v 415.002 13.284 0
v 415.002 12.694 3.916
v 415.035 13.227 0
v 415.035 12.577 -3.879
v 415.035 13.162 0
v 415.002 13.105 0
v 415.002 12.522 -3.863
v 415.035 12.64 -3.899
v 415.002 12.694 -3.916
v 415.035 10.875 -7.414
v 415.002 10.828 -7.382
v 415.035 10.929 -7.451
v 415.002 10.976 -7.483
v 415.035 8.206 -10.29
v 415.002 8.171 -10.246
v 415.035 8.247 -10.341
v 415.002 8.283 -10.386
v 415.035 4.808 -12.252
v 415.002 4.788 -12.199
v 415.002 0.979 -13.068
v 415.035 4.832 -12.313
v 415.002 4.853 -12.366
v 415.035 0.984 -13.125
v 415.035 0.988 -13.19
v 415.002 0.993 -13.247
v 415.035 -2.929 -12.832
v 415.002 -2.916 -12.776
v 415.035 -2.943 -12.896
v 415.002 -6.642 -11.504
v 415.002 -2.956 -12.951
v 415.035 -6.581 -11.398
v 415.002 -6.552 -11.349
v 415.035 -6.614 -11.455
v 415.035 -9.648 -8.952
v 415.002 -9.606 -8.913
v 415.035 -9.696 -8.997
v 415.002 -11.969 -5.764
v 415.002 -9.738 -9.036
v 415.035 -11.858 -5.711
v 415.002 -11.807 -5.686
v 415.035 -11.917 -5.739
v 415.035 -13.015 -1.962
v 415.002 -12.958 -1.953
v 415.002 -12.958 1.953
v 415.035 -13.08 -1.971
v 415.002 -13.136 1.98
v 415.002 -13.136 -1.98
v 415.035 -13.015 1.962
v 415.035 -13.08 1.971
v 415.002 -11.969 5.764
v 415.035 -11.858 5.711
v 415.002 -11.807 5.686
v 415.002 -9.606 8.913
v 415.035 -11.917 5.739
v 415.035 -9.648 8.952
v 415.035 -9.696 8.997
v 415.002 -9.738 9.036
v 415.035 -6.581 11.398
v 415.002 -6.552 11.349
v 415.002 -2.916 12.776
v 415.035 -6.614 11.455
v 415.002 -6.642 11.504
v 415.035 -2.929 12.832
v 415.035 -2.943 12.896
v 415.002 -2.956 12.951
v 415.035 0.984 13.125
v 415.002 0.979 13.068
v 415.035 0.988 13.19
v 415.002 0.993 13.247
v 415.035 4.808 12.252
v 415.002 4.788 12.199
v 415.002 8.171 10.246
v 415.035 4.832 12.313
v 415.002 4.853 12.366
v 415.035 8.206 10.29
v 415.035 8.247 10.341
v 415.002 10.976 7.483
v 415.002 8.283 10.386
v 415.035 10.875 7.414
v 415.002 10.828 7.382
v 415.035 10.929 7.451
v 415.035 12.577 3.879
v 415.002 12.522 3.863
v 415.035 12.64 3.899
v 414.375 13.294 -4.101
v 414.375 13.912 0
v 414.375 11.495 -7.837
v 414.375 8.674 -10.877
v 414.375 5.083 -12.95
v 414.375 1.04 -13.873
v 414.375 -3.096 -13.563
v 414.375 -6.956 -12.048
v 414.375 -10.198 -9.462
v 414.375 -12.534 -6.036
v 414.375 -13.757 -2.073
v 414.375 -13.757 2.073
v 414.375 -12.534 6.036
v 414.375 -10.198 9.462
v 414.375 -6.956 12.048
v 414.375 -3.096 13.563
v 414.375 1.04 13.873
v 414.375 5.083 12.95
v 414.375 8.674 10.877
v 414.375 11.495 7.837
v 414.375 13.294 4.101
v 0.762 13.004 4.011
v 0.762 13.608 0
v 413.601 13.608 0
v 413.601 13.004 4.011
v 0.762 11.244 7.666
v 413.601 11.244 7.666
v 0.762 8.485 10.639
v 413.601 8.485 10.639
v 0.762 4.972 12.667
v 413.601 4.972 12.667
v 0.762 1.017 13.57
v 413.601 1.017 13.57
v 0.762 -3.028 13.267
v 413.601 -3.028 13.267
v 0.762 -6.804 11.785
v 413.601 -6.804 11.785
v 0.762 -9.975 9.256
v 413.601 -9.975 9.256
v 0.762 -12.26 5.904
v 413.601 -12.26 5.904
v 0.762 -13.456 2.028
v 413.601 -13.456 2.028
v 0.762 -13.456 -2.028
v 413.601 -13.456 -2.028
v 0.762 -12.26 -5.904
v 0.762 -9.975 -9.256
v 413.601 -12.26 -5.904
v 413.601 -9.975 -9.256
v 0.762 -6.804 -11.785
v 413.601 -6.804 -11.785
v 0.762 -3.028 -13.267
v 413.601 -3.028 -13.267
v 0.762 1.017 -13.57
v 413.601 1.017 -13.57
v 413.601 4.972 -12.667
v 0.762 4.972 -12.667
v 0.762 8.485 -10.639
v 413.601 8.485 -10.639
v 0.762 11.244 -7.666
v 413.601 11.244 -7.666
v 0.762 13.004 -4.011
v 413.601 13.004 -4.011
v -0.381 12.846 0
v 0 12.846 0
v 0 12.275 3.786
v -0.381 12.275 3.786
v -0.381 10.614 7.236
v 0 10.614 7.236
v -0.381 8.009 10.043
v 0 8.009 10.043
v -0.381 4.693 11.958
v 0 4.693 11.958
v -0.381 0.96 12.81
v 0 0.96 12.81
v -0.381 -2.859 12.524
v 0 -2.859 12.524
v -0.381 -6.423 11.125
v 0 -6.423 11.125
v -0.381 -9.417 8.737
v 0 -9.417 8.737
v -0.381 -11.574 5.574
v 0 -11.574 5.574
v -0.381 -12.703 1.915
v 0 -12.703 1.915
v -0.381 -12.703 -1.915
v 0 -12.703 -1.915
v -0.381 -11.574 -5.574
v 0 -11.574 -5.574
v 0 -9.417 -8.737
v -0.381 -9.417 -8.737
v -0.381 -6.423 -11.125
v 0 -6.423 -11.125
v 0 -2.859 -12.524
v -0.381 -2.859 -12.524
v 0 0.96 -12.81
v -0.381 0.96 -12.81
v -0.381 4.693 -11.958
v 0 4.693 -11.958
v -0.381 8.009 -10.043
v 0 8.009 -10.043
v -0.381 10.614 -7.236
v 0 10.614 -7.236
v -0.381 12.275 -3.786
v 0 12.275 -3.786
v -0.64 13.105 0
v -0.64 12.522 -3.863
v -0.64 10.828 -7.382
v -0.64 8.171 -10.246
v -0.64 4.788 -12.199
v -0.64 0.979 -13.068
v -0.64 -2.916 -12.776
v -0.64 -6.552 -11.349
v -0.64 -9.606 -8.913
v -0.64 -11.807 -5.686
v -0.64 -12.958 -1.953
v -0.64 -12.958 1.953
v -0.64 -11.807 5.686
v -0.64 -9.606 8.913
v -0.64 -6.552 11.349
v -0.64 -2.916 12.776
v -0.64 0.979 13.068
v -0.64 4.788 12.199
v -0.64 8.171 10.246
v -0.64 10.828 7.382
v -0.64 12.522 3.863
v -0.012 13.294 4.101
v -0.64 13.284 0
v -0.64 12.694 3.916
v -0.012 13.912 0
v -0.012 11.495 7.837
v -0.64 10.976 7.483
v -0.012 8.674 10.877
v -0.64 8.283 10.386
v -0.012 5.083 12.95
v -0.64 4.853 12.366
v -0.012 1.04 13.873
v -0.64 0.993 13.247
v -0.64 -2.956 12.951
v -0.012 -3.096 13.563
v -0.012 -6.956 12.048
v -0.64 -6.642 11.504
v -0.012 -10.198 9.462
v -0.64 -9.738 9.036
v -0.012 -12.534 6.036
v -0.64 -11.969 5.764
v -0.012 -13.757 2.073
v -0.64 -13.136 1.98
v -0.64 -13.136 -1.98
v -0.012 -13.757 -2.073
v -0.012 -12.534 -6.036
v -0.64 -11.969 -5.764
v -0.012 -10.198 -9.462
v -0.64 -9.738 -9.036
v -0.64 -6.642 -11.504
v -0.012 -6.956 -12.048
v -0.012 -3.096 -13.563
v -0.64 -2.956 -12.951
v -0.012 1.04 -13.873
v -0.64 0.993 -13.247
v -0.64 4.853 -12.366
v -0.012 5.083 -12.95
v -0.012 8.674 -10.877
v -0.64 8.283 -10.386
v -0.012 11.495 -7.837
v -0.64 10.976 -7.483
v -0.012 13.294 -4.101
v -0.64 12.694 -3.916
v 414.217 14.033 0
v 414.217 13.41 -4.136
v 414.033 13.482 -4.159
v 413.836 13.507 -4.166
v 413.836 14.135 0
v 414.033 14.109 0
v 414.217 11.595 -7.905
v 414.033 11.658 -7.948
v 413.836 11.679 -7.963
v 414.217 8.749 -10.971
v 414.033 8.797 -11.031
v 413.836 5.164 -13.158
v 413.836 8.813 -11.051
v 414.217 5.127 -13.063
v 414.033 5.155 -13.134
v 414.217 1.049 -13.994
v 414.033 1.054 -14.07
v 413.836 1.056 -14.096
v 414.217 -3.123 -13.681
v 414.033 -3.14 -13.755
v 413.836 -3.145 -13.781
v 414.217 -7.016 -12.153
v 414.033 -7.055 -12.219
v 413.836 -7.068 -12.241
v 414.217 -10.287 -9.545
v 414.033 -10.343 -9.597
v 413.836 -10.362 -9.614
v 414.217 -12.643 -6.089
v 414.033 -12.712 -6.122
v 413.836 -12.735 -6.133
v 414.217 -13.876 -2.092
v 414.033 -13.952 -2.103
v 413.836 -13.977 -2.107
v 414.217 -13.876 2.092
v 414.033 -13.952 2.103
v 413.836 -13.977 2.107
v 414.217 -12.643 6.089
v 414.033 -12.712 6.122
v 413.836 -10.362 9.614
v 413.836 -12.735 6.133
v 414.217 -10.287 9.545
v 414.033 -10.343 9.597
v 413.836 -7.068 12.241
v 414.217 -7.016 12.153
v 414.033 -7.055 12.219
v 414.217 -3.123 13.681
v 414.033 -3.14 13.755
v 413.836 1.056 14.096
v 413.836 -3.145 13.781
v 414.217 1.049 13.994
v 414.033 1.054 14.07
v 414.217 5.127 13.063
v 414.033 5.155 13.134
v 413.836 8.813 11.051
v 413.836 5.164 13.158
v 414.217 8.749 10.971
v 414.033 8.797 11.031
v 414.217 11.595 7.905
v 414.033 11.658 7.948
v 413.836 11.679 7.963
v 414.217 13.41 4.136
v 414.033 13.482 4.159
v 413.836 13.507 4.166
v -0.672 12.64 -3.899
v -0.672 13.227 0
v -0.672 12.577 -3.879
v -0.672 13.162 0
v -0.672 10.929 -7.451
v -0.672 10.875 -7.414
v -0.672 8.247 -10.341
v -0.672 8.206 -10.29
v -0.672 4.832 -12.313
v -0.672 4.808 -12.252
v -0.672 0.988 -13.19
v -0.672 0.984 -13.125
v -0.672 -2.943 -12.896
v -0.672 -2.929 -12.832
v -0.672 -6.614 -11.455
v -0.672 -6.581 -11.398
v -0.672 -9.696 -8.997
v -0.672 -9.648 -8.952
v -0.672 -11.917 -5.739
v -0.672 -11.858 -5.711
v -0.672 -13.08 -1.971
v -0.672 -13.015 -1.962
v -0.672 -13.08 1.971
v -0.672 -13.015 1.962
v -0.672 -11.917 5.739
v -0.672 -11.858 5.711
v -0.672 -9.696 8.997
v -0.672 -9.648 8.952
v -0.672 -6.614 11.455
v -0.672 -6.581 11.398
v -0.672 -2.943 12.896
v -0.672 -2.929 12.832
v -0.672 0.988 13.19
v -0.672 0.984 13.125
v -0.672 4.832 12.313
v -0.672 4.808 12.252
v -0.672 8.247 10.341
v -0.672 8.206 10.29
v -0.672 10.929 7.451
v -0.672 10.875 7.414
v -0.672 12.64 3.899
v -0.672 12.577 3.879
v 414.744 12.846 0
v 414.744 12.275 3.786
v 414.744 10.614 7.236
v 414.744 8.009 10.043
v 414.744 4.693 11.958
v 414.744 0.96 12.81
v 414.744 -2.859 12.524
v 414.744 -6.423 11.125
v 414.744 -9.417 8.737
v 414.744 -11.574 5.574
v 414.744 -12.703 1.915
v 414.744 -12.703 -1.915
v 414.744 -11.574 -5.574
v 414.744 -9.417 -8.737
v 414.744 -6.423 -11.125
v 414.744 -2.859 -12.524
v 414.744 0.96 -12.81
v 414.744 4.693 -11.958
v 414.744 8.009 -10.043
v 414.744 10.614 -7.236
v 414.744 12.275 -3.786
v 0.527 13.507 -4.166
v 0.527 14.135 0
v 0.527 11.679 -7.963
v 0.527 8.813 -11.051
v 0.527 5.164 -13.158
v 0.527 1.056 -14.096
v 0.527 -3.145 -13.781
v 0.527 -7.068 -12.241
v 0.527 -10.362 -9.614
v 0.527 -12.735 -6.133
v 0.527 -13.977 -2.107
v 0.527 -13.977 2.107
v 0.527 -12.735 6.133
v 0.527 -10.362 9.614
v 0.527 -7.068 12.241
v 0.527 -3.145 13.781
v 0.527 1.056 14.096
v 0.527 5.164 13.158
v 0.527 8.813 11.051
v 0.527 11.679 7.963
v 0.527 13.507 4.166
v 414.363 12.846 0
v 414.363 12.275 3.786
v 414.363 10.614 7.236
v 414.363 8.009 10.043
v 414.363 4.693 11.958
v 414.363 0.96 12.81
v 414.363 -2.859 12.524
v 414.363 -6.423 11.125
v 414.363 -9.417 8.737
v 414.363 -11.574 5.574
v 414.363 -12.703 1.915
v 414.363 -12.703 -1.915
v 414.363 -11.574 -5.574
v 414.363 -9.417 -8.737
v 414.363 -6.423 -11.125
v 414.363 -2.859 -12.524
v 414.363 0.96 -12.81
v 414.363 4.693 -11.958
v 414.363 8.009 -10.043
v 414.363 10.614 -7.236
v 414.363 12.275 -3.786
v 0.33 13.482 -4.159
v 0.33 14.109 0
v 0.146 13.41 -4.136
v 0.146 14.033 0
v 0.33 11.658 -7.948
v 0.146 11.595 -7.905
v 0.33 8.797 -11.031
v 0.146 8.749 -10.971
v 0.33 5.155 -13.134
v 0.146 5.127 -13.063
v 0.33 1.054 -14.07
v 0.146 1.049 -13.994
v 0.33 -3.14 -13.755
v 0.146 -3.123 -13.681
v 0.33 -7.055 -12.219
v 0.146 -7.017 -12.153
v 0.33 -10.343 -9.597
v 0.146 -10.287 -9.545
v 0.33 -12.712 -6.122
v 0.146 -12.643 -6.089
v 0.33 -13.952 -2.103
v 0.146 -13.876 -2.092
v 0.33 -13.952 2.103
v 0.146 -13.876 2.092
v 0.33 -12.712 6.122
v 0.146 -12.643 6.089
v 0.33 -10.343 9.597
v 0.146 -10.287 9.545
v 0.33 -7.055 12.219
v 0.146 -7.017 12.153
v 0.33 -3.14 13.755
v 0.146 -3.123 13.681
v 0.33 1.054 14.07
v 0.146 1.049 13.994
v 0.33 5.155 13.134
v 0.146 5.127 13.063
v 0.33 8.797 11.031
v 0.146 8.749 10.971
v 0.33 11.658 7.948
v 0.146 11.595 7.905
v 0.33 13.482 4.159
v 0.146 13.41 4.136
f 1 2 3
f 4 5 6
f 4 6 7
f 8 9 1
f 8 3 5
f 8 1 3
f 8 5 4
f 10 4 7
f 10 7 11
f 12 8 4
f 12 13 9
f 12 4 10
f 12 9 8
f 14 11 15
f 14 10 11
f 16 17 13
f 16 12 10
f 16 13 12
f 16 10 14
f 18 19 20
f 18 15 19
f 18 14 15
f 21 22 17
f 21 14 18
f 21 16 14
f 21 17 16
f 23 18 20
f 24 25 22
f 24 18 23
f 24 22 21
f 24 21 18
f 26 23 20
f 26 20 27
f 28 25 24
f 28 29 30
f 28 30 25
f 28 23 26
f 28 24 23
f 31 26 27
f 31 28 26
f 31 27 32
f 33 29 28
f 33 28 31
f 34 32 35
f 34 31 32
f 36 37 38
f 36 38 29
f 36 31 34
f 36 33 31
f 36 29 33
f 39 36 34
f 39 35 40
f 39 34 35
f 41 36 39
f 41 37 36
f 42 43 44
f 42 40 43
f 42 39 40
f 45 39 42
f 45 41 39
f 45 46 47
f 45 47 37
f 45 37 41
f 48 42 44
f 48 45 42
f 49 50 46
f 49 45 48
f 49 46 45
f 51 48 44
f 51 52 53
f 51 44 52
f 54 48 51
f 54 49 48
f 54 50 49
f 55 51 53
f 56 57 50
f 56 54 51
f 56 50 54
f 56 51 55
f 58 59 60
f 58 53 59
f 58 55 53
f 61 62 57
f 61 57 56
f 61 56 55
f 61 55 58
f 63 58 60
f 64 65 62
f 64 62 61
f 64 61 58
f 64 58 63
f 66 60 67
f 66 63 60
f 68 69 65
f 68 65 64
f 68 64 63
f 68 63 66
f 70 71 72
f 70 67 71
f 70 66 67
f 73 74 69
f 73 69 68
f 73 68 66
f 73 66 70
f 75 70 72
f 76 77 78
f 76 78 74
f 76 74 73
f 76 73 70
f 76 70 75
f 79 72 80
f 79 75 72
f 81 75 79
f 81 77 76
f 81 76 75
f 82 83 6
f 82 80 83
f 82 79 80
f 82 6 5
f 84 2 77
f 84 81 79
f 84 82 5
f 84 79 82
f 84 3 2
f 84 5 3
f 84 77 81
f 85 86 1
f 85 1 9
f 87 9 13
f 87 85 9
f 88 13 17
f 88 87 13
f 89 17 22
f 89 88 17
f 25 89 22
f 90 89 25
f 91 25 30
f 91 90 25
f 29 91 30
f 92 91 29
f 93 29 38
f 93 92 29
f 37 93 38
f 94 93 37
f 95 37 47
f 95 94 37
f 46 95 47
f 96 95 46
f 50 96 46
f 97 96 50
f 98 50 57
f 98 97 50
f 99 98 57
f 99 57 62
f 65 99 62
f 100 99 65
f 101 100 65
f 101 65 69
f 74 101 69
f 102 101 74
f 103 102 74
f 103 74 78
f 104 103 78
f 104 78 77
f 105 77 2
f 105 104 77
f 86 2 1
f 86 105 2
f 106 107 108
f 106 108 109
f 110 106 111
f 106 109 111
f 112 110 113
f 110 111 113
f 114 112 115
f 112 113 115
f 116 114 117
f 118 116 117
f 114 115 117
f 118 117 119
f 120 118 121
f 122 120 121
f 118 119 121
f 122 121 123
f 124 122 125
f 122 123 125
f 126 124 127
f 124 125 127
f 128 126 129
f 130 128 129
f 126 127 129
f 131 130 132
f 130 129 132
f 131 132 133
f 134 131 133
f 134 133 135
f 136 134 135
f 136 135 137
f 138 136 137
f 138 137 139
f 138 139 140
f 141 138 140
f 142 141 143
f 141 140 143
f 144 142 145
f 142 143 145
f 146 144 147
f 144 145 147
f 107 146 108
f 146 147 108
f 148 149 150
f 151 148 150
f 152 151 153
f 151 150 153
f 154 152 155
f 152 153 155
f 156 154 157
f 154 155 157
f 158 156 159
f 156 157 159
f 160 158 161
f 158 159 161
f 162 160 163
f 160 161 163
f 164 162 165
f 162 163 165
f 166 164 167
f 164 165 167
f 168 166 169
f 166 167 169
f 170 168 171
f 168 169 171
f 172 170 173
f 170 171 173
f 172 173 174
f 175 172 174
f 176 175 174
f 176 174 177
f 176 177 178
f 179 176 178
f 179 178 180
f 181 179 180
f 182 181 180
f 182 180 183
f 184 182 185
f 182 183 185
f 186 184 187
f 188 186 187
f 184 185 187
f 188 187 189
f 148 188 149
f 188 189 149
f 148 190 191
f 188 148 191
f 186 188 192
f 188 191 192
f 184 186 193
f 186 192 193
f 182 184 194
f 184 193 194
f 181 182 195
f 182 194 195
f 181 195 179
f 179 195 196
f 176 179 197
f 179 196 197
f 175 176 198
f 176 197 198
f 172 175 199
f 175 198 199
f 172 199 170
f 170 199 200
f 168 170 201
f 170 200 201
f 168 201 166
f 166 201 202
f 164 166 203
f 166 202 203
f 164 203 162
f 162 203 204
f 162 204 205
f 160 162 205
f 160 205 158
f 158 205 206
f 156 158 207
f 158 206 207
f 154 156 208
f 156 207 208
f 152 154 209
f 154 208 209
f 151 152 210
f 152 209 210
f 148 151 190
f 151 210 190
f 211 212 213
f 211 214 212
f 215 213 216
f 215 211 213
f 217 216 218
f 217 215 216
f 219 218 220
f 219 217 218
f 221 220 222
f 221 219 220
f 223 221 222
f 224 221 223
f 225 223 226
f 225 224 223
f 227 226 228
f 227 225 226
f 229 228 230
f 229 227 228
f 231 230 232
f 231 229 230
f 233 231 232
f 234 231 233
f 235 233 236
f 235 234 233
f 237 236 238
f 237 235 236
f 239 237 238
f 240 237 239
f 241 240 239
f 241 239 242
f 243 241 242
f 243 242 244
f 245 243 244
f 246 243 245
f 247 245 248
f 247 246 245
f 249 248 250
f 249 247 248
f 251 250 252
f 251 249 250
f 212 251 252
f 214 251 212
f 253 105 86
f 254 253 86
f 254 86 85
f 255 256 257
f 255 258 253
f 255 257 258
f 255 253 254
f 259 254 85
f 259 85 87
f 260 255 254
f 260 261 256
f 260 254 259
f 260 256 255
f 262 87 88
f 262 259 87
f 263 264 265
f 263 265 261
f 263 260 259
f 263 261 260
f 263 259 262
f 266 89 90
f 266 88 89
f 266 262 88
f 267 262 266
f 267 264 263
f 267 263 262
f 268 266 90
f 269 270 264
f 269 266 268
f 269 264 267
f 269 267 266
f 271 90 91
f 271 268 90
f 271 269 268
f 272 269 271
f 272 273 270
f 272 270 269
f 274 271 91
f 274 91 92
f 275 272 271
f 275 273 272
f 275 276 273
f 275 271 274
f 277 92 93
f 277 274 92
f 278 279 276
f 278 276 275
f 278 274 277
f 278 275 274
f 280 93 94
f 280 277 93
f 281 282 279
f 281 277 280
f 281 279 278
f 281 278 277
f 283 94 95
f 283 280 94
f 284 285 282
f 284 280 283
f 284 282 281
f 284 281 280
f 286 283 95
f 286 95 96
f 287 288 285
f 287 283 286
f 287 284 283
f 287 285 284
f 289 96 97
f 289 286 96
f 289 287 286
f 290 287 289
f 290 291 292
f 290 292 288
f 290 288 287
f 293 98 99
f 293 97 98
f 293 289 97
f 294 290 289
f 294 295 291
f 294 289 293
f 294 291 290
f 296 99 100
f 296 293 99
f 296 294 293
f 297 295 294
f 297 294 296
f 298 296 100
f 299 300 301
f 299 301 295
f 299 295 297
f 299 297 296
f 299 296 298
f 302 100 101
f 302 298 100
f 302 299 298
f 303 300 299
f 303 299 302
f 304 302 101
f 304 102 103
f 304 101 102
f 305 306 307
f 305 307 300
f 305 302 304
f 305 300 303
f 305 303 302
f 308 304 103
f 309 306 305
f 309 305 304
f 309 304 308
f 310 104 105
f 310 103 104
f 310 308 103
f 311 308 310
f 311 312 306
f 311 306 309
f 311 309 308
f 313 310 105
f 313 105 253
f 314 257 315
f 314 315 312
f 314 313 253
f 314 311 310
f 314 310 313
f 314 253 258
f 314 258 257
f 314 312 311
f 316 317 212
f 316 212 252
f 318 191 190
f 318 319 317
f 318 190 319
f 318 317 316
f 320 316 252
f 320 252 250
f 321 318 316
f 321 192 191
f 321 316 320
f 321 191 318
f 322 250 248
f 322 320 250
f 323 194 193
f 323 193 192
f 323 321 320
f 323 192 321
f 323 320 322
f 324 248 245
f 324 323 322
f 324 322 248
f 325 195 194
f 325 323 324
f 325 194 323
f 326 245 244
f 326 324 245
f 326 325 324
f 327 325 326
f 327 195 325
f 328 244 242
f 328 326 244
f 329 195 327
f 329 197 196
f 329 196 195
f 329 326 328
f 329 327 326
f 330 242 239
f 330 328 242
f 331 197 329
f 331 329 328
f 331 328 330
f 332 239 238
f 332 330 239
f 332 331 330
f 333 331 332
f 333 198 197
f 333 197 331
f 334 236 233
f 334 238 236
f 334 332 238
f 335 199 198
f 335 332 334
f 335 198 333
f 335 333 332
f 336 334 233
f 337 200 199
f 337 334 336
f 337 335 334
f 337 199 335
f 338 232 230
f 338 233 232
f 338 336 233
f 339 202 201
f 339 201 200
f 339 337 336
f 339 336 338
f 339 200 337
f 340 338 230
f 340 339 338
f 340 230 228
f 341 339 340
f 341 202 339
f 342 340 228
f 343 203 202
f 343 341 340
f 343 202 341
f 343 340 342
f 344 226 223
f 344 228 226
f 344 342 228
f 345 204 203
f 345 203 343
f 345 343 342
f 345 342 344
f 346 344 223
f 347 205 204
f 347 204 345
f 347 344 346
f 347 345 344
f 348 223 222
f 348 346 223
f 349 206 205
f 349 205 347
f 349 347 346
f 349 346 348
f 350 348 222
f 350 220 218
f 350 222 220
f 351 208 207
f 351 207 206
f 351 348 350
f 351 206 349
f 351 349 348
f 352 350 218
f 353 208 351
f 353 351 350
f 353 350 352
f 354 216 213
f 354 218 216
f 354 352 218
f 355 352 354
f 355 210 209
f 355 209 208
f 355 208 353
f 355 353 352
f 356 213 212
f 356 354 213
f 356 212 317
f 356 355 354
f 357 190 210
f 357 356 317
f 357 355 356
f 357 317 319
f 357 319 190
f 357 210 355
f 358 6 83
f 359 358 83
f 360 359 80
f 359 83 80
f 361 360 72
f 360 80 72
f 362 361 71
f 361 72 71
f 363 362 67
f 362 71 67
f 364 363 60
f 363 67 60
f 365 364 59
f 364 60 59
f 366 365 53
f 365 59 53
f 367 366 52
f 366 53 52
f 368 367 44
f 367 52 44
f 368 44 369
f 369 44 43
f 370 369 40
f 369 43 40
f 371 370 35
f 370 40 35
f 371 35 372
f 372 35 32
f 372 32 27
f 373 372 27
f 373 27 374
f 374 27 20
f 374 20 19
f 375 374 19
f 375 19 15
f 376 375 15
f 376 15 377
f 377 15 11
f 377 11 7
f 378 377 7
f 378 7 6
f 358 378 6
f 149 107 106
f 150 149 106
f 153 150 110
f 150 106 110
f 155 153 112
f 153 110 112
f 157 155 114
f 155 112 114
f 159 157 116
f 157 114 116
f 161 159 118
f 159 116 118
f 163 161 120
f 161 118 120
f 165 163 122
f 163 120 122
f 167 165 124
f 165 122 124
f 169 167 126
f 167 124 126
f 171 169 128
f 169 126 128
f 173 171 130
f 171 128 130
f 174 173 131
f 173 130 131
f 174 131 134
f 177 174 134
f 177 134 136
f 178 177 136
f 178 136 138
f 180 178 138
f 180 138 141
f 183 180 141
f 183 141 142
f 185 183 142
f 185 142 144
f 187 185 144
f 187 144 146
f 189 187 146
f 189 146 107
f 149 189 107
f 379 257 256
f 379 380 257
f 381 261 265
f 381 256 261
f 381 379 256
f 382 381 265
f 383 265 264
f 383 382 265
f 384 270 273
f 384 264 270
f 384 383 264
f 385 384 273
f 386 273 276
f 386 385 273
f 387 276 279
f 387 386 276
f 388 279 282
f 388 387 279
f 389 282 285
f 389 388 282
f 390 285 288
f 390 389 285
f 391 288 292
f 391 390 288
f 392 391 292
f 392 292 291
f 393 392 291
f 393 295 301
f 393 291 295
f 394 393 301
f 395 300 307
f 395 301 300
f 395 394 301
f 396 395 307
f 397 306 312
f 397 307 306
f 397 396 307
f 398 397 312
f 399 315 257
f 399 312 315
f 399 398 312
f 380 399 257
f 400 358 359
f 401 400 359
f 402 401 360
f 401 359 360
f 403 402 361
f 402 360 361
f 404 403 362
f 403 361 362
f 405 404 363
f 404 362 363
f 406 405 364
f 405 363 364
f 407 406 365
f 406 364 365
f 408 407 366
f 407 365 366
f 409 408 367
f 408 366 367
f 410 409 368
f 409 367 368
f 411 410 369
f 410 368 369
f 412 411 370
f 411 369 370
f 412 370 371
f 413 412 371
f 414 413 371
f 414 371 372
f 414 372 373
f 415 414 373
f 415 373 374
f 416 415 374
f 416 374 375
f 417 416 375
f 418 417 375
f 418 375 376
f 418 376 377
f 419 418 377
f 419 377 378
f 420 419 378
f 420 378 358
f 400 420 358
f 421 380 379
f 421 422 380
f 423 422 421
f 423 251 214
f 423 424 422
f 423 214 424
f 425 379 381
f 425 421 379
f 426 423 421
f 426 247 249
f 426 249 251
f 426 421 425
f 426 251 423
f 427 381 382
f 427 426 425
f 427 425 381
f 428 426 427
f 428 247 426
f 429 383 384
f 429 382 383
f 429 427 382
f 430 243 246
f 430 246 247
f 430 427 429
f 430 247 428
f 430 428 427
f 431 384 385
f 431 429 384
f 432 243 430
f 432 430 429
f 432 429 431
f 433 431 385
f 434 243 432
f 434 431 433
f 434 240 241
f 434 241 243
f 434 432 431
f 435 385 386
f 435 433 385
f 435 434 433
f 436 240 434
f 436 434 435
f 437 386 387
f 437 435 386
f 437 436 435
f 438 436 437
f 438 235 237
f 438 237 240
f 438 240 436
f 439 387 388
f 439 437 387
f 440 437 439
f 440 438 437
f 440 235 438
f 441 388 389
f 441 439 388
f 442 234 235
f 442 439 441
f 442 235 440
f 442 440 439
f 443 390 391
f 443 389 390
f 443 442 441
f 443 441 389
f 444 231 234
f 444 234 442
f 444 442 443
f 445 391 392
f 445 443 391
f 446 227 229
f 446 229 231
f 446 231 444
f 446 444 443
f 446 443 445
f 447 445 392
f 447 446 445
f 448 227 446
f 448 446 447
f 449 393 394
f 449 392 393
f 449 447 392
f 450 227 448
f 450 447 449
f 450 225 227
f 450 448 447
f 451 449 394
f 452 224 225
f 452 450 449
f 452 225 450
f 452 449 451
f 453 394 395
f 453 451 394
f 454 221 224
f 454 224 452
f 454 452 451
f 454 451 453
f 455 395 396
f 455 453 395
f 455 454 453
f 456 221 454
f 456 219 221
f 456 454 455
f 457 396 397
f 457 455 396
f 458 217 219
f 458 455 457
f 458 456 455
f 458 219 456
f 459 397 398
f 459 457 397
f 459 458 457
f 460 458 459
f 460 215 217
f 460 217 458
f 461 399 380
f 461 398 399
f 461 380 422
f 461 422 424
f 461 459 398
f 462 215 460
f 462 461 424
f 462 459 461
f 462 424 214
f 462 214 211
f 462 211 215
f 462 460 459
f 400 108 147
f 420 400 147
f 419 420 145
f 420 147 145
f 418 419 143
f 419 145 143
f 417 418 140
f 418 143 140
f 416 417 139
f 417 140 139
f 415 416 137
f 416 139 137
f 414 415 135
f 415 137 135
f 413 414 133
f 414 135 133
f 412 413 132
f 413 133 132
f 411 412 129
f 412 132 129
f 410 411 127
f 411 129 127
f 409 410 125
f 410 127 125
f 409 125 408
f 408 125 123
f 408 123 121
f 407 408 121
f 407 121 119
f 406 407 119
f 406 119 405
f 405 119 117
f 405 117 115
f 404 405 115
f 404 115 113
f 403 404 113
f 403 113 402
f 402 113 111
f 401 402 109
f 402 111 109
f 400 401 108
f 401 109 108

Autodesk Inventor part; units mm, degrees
sketch "Sketch_1" plane through (0, 0, 0) normal (0, 0, 1) x (1, 0, 0)
  line L0 (414.3629, 0) -> (0, 0)
  arc A0 (-0.6395, 13.2842) -> (-0.6395, 13.1046) centre (-0.5497, 13.1944) ccw
  line L1 (-0.6395, 13.1046) -> (-0.381, 12.846)
  line L2 (-0.381, 12.846) -> (0, 12.846)
  line L3 (0, 12.846) -> (0.762, 13.6081)
  line L4 (0.762, 13.6081) -> (413.6009, 13.6081)
  line L5 (413.6009, 13.6081) -> (414.3629, 12.846)
  line L6 (414.3629, 12.846) -> (414.7439, 12.846)
  line L7 (414.7439, 12.846) -> (415.0024, 13.1046)
  arc A1 (415.0024, 13.1046) -> (415.0024, 13.2842) centre (414.9126, 13.1944) ccw
  line L8 (415.0024, 13.2842) -> (414.3747, 13.9119)
  arc A2 (414.3747, 13.9119) -> (413.8359, 14.1351) centre (413.8359, 13.3731) ccw
  line L9 (413.8359, 14.1351) -> (0.527, 14.1351)
  arc A3 (0.527, 14.1351) -> (-0.0118, 13.9119) centre (0.527, 13.3731) ccw
  line L10 (-0.0118, 13.9119) -> (-0.6395, 13.2842)
revolve "Revolution1" add sketch "Sketch_1" angle 360 about axis through (414.3629, 0, 0) along (1, 0, 0)
ref_plane "tube_front_XY" through (0, 0, 0) normal (1, 0, 0) x (0, 0, -1)
ref_plane "tube_front_YZ" through (0, 0, 0) normal (0, 0, -1) x (0, 1, 0)
ref_plane "tube_front_ZX" through (0, 0, 0) normal (0, 1, 0) x (1, 0, 0)
ref_plane "tube_rear_XY" through (414.3629, 0, 0) normal (1, 0, 0) x (0, 0, -1)
ref_plane "tube_rear_YZ" through (414.3629, 0, 0) normal (0, 0, -1) x (0, 1, 0)
ref_plane "tube_rear_ZX" through (414.3629, 0, 0) normal (0, 1, 0) x (1, 0, 0)
ref_plane "cp1_XY" through (207.1815, 14.1351, 0) normal (1, 0, 0) x (0, 0, -1)
ref_plane "cp1_YZ" through (207.1815, 14.1351, 0) normal (0, 0, -1) x (0, 1, 0)
ref_plane "cp1_ZX" through (207.1815, 14.1351, 0) normal (0, 1, 0) x (1, 0, 0)
ref_plane "cp2_XY" through (207.1815, 0, -14.1351) normal (1, 0, 0) x (0, 0, -1)
ref_plane "cp2_YZ" through (207.1815, 0, -14.1351) normal (0, 0, -1) x (0, 1, 0)
ref_plane "cp2_ZX" through (207.1815, 0, -14.1351) normal (0, 1, 0) x (1, 0, 0)
ref_plane "cp3_XY" through (207.1815, -14.1351, 0) normal (1, 0, 0) x (0, 0, -1)
ref_plane "cp3_YZ" through (207.1815, -14.1351, 0) normal (0, 0, -1) x (0, 1, 0)
ref_plane "cp3_ZX" through (207.1815, -14.1351, 0) normal (0, 1, 0) x (1, 0, 0)
ref_plane "cp4_XY" through (207.1815, 0, 14.1351) normal (1, 0, 0) x (0, 0, -1)
ref_plane "cp4_YZ" through (207.1815, 0, 14.1351) normal (0, 0, -1) x (0, 1, 0)
ref_plane "cp4_ZX" through (207.1815, 0, 14.1351) normal (0, 1, 0) x (1, 0, 0)
properties part number "09R-16.31350" material "Stainless Steel"
